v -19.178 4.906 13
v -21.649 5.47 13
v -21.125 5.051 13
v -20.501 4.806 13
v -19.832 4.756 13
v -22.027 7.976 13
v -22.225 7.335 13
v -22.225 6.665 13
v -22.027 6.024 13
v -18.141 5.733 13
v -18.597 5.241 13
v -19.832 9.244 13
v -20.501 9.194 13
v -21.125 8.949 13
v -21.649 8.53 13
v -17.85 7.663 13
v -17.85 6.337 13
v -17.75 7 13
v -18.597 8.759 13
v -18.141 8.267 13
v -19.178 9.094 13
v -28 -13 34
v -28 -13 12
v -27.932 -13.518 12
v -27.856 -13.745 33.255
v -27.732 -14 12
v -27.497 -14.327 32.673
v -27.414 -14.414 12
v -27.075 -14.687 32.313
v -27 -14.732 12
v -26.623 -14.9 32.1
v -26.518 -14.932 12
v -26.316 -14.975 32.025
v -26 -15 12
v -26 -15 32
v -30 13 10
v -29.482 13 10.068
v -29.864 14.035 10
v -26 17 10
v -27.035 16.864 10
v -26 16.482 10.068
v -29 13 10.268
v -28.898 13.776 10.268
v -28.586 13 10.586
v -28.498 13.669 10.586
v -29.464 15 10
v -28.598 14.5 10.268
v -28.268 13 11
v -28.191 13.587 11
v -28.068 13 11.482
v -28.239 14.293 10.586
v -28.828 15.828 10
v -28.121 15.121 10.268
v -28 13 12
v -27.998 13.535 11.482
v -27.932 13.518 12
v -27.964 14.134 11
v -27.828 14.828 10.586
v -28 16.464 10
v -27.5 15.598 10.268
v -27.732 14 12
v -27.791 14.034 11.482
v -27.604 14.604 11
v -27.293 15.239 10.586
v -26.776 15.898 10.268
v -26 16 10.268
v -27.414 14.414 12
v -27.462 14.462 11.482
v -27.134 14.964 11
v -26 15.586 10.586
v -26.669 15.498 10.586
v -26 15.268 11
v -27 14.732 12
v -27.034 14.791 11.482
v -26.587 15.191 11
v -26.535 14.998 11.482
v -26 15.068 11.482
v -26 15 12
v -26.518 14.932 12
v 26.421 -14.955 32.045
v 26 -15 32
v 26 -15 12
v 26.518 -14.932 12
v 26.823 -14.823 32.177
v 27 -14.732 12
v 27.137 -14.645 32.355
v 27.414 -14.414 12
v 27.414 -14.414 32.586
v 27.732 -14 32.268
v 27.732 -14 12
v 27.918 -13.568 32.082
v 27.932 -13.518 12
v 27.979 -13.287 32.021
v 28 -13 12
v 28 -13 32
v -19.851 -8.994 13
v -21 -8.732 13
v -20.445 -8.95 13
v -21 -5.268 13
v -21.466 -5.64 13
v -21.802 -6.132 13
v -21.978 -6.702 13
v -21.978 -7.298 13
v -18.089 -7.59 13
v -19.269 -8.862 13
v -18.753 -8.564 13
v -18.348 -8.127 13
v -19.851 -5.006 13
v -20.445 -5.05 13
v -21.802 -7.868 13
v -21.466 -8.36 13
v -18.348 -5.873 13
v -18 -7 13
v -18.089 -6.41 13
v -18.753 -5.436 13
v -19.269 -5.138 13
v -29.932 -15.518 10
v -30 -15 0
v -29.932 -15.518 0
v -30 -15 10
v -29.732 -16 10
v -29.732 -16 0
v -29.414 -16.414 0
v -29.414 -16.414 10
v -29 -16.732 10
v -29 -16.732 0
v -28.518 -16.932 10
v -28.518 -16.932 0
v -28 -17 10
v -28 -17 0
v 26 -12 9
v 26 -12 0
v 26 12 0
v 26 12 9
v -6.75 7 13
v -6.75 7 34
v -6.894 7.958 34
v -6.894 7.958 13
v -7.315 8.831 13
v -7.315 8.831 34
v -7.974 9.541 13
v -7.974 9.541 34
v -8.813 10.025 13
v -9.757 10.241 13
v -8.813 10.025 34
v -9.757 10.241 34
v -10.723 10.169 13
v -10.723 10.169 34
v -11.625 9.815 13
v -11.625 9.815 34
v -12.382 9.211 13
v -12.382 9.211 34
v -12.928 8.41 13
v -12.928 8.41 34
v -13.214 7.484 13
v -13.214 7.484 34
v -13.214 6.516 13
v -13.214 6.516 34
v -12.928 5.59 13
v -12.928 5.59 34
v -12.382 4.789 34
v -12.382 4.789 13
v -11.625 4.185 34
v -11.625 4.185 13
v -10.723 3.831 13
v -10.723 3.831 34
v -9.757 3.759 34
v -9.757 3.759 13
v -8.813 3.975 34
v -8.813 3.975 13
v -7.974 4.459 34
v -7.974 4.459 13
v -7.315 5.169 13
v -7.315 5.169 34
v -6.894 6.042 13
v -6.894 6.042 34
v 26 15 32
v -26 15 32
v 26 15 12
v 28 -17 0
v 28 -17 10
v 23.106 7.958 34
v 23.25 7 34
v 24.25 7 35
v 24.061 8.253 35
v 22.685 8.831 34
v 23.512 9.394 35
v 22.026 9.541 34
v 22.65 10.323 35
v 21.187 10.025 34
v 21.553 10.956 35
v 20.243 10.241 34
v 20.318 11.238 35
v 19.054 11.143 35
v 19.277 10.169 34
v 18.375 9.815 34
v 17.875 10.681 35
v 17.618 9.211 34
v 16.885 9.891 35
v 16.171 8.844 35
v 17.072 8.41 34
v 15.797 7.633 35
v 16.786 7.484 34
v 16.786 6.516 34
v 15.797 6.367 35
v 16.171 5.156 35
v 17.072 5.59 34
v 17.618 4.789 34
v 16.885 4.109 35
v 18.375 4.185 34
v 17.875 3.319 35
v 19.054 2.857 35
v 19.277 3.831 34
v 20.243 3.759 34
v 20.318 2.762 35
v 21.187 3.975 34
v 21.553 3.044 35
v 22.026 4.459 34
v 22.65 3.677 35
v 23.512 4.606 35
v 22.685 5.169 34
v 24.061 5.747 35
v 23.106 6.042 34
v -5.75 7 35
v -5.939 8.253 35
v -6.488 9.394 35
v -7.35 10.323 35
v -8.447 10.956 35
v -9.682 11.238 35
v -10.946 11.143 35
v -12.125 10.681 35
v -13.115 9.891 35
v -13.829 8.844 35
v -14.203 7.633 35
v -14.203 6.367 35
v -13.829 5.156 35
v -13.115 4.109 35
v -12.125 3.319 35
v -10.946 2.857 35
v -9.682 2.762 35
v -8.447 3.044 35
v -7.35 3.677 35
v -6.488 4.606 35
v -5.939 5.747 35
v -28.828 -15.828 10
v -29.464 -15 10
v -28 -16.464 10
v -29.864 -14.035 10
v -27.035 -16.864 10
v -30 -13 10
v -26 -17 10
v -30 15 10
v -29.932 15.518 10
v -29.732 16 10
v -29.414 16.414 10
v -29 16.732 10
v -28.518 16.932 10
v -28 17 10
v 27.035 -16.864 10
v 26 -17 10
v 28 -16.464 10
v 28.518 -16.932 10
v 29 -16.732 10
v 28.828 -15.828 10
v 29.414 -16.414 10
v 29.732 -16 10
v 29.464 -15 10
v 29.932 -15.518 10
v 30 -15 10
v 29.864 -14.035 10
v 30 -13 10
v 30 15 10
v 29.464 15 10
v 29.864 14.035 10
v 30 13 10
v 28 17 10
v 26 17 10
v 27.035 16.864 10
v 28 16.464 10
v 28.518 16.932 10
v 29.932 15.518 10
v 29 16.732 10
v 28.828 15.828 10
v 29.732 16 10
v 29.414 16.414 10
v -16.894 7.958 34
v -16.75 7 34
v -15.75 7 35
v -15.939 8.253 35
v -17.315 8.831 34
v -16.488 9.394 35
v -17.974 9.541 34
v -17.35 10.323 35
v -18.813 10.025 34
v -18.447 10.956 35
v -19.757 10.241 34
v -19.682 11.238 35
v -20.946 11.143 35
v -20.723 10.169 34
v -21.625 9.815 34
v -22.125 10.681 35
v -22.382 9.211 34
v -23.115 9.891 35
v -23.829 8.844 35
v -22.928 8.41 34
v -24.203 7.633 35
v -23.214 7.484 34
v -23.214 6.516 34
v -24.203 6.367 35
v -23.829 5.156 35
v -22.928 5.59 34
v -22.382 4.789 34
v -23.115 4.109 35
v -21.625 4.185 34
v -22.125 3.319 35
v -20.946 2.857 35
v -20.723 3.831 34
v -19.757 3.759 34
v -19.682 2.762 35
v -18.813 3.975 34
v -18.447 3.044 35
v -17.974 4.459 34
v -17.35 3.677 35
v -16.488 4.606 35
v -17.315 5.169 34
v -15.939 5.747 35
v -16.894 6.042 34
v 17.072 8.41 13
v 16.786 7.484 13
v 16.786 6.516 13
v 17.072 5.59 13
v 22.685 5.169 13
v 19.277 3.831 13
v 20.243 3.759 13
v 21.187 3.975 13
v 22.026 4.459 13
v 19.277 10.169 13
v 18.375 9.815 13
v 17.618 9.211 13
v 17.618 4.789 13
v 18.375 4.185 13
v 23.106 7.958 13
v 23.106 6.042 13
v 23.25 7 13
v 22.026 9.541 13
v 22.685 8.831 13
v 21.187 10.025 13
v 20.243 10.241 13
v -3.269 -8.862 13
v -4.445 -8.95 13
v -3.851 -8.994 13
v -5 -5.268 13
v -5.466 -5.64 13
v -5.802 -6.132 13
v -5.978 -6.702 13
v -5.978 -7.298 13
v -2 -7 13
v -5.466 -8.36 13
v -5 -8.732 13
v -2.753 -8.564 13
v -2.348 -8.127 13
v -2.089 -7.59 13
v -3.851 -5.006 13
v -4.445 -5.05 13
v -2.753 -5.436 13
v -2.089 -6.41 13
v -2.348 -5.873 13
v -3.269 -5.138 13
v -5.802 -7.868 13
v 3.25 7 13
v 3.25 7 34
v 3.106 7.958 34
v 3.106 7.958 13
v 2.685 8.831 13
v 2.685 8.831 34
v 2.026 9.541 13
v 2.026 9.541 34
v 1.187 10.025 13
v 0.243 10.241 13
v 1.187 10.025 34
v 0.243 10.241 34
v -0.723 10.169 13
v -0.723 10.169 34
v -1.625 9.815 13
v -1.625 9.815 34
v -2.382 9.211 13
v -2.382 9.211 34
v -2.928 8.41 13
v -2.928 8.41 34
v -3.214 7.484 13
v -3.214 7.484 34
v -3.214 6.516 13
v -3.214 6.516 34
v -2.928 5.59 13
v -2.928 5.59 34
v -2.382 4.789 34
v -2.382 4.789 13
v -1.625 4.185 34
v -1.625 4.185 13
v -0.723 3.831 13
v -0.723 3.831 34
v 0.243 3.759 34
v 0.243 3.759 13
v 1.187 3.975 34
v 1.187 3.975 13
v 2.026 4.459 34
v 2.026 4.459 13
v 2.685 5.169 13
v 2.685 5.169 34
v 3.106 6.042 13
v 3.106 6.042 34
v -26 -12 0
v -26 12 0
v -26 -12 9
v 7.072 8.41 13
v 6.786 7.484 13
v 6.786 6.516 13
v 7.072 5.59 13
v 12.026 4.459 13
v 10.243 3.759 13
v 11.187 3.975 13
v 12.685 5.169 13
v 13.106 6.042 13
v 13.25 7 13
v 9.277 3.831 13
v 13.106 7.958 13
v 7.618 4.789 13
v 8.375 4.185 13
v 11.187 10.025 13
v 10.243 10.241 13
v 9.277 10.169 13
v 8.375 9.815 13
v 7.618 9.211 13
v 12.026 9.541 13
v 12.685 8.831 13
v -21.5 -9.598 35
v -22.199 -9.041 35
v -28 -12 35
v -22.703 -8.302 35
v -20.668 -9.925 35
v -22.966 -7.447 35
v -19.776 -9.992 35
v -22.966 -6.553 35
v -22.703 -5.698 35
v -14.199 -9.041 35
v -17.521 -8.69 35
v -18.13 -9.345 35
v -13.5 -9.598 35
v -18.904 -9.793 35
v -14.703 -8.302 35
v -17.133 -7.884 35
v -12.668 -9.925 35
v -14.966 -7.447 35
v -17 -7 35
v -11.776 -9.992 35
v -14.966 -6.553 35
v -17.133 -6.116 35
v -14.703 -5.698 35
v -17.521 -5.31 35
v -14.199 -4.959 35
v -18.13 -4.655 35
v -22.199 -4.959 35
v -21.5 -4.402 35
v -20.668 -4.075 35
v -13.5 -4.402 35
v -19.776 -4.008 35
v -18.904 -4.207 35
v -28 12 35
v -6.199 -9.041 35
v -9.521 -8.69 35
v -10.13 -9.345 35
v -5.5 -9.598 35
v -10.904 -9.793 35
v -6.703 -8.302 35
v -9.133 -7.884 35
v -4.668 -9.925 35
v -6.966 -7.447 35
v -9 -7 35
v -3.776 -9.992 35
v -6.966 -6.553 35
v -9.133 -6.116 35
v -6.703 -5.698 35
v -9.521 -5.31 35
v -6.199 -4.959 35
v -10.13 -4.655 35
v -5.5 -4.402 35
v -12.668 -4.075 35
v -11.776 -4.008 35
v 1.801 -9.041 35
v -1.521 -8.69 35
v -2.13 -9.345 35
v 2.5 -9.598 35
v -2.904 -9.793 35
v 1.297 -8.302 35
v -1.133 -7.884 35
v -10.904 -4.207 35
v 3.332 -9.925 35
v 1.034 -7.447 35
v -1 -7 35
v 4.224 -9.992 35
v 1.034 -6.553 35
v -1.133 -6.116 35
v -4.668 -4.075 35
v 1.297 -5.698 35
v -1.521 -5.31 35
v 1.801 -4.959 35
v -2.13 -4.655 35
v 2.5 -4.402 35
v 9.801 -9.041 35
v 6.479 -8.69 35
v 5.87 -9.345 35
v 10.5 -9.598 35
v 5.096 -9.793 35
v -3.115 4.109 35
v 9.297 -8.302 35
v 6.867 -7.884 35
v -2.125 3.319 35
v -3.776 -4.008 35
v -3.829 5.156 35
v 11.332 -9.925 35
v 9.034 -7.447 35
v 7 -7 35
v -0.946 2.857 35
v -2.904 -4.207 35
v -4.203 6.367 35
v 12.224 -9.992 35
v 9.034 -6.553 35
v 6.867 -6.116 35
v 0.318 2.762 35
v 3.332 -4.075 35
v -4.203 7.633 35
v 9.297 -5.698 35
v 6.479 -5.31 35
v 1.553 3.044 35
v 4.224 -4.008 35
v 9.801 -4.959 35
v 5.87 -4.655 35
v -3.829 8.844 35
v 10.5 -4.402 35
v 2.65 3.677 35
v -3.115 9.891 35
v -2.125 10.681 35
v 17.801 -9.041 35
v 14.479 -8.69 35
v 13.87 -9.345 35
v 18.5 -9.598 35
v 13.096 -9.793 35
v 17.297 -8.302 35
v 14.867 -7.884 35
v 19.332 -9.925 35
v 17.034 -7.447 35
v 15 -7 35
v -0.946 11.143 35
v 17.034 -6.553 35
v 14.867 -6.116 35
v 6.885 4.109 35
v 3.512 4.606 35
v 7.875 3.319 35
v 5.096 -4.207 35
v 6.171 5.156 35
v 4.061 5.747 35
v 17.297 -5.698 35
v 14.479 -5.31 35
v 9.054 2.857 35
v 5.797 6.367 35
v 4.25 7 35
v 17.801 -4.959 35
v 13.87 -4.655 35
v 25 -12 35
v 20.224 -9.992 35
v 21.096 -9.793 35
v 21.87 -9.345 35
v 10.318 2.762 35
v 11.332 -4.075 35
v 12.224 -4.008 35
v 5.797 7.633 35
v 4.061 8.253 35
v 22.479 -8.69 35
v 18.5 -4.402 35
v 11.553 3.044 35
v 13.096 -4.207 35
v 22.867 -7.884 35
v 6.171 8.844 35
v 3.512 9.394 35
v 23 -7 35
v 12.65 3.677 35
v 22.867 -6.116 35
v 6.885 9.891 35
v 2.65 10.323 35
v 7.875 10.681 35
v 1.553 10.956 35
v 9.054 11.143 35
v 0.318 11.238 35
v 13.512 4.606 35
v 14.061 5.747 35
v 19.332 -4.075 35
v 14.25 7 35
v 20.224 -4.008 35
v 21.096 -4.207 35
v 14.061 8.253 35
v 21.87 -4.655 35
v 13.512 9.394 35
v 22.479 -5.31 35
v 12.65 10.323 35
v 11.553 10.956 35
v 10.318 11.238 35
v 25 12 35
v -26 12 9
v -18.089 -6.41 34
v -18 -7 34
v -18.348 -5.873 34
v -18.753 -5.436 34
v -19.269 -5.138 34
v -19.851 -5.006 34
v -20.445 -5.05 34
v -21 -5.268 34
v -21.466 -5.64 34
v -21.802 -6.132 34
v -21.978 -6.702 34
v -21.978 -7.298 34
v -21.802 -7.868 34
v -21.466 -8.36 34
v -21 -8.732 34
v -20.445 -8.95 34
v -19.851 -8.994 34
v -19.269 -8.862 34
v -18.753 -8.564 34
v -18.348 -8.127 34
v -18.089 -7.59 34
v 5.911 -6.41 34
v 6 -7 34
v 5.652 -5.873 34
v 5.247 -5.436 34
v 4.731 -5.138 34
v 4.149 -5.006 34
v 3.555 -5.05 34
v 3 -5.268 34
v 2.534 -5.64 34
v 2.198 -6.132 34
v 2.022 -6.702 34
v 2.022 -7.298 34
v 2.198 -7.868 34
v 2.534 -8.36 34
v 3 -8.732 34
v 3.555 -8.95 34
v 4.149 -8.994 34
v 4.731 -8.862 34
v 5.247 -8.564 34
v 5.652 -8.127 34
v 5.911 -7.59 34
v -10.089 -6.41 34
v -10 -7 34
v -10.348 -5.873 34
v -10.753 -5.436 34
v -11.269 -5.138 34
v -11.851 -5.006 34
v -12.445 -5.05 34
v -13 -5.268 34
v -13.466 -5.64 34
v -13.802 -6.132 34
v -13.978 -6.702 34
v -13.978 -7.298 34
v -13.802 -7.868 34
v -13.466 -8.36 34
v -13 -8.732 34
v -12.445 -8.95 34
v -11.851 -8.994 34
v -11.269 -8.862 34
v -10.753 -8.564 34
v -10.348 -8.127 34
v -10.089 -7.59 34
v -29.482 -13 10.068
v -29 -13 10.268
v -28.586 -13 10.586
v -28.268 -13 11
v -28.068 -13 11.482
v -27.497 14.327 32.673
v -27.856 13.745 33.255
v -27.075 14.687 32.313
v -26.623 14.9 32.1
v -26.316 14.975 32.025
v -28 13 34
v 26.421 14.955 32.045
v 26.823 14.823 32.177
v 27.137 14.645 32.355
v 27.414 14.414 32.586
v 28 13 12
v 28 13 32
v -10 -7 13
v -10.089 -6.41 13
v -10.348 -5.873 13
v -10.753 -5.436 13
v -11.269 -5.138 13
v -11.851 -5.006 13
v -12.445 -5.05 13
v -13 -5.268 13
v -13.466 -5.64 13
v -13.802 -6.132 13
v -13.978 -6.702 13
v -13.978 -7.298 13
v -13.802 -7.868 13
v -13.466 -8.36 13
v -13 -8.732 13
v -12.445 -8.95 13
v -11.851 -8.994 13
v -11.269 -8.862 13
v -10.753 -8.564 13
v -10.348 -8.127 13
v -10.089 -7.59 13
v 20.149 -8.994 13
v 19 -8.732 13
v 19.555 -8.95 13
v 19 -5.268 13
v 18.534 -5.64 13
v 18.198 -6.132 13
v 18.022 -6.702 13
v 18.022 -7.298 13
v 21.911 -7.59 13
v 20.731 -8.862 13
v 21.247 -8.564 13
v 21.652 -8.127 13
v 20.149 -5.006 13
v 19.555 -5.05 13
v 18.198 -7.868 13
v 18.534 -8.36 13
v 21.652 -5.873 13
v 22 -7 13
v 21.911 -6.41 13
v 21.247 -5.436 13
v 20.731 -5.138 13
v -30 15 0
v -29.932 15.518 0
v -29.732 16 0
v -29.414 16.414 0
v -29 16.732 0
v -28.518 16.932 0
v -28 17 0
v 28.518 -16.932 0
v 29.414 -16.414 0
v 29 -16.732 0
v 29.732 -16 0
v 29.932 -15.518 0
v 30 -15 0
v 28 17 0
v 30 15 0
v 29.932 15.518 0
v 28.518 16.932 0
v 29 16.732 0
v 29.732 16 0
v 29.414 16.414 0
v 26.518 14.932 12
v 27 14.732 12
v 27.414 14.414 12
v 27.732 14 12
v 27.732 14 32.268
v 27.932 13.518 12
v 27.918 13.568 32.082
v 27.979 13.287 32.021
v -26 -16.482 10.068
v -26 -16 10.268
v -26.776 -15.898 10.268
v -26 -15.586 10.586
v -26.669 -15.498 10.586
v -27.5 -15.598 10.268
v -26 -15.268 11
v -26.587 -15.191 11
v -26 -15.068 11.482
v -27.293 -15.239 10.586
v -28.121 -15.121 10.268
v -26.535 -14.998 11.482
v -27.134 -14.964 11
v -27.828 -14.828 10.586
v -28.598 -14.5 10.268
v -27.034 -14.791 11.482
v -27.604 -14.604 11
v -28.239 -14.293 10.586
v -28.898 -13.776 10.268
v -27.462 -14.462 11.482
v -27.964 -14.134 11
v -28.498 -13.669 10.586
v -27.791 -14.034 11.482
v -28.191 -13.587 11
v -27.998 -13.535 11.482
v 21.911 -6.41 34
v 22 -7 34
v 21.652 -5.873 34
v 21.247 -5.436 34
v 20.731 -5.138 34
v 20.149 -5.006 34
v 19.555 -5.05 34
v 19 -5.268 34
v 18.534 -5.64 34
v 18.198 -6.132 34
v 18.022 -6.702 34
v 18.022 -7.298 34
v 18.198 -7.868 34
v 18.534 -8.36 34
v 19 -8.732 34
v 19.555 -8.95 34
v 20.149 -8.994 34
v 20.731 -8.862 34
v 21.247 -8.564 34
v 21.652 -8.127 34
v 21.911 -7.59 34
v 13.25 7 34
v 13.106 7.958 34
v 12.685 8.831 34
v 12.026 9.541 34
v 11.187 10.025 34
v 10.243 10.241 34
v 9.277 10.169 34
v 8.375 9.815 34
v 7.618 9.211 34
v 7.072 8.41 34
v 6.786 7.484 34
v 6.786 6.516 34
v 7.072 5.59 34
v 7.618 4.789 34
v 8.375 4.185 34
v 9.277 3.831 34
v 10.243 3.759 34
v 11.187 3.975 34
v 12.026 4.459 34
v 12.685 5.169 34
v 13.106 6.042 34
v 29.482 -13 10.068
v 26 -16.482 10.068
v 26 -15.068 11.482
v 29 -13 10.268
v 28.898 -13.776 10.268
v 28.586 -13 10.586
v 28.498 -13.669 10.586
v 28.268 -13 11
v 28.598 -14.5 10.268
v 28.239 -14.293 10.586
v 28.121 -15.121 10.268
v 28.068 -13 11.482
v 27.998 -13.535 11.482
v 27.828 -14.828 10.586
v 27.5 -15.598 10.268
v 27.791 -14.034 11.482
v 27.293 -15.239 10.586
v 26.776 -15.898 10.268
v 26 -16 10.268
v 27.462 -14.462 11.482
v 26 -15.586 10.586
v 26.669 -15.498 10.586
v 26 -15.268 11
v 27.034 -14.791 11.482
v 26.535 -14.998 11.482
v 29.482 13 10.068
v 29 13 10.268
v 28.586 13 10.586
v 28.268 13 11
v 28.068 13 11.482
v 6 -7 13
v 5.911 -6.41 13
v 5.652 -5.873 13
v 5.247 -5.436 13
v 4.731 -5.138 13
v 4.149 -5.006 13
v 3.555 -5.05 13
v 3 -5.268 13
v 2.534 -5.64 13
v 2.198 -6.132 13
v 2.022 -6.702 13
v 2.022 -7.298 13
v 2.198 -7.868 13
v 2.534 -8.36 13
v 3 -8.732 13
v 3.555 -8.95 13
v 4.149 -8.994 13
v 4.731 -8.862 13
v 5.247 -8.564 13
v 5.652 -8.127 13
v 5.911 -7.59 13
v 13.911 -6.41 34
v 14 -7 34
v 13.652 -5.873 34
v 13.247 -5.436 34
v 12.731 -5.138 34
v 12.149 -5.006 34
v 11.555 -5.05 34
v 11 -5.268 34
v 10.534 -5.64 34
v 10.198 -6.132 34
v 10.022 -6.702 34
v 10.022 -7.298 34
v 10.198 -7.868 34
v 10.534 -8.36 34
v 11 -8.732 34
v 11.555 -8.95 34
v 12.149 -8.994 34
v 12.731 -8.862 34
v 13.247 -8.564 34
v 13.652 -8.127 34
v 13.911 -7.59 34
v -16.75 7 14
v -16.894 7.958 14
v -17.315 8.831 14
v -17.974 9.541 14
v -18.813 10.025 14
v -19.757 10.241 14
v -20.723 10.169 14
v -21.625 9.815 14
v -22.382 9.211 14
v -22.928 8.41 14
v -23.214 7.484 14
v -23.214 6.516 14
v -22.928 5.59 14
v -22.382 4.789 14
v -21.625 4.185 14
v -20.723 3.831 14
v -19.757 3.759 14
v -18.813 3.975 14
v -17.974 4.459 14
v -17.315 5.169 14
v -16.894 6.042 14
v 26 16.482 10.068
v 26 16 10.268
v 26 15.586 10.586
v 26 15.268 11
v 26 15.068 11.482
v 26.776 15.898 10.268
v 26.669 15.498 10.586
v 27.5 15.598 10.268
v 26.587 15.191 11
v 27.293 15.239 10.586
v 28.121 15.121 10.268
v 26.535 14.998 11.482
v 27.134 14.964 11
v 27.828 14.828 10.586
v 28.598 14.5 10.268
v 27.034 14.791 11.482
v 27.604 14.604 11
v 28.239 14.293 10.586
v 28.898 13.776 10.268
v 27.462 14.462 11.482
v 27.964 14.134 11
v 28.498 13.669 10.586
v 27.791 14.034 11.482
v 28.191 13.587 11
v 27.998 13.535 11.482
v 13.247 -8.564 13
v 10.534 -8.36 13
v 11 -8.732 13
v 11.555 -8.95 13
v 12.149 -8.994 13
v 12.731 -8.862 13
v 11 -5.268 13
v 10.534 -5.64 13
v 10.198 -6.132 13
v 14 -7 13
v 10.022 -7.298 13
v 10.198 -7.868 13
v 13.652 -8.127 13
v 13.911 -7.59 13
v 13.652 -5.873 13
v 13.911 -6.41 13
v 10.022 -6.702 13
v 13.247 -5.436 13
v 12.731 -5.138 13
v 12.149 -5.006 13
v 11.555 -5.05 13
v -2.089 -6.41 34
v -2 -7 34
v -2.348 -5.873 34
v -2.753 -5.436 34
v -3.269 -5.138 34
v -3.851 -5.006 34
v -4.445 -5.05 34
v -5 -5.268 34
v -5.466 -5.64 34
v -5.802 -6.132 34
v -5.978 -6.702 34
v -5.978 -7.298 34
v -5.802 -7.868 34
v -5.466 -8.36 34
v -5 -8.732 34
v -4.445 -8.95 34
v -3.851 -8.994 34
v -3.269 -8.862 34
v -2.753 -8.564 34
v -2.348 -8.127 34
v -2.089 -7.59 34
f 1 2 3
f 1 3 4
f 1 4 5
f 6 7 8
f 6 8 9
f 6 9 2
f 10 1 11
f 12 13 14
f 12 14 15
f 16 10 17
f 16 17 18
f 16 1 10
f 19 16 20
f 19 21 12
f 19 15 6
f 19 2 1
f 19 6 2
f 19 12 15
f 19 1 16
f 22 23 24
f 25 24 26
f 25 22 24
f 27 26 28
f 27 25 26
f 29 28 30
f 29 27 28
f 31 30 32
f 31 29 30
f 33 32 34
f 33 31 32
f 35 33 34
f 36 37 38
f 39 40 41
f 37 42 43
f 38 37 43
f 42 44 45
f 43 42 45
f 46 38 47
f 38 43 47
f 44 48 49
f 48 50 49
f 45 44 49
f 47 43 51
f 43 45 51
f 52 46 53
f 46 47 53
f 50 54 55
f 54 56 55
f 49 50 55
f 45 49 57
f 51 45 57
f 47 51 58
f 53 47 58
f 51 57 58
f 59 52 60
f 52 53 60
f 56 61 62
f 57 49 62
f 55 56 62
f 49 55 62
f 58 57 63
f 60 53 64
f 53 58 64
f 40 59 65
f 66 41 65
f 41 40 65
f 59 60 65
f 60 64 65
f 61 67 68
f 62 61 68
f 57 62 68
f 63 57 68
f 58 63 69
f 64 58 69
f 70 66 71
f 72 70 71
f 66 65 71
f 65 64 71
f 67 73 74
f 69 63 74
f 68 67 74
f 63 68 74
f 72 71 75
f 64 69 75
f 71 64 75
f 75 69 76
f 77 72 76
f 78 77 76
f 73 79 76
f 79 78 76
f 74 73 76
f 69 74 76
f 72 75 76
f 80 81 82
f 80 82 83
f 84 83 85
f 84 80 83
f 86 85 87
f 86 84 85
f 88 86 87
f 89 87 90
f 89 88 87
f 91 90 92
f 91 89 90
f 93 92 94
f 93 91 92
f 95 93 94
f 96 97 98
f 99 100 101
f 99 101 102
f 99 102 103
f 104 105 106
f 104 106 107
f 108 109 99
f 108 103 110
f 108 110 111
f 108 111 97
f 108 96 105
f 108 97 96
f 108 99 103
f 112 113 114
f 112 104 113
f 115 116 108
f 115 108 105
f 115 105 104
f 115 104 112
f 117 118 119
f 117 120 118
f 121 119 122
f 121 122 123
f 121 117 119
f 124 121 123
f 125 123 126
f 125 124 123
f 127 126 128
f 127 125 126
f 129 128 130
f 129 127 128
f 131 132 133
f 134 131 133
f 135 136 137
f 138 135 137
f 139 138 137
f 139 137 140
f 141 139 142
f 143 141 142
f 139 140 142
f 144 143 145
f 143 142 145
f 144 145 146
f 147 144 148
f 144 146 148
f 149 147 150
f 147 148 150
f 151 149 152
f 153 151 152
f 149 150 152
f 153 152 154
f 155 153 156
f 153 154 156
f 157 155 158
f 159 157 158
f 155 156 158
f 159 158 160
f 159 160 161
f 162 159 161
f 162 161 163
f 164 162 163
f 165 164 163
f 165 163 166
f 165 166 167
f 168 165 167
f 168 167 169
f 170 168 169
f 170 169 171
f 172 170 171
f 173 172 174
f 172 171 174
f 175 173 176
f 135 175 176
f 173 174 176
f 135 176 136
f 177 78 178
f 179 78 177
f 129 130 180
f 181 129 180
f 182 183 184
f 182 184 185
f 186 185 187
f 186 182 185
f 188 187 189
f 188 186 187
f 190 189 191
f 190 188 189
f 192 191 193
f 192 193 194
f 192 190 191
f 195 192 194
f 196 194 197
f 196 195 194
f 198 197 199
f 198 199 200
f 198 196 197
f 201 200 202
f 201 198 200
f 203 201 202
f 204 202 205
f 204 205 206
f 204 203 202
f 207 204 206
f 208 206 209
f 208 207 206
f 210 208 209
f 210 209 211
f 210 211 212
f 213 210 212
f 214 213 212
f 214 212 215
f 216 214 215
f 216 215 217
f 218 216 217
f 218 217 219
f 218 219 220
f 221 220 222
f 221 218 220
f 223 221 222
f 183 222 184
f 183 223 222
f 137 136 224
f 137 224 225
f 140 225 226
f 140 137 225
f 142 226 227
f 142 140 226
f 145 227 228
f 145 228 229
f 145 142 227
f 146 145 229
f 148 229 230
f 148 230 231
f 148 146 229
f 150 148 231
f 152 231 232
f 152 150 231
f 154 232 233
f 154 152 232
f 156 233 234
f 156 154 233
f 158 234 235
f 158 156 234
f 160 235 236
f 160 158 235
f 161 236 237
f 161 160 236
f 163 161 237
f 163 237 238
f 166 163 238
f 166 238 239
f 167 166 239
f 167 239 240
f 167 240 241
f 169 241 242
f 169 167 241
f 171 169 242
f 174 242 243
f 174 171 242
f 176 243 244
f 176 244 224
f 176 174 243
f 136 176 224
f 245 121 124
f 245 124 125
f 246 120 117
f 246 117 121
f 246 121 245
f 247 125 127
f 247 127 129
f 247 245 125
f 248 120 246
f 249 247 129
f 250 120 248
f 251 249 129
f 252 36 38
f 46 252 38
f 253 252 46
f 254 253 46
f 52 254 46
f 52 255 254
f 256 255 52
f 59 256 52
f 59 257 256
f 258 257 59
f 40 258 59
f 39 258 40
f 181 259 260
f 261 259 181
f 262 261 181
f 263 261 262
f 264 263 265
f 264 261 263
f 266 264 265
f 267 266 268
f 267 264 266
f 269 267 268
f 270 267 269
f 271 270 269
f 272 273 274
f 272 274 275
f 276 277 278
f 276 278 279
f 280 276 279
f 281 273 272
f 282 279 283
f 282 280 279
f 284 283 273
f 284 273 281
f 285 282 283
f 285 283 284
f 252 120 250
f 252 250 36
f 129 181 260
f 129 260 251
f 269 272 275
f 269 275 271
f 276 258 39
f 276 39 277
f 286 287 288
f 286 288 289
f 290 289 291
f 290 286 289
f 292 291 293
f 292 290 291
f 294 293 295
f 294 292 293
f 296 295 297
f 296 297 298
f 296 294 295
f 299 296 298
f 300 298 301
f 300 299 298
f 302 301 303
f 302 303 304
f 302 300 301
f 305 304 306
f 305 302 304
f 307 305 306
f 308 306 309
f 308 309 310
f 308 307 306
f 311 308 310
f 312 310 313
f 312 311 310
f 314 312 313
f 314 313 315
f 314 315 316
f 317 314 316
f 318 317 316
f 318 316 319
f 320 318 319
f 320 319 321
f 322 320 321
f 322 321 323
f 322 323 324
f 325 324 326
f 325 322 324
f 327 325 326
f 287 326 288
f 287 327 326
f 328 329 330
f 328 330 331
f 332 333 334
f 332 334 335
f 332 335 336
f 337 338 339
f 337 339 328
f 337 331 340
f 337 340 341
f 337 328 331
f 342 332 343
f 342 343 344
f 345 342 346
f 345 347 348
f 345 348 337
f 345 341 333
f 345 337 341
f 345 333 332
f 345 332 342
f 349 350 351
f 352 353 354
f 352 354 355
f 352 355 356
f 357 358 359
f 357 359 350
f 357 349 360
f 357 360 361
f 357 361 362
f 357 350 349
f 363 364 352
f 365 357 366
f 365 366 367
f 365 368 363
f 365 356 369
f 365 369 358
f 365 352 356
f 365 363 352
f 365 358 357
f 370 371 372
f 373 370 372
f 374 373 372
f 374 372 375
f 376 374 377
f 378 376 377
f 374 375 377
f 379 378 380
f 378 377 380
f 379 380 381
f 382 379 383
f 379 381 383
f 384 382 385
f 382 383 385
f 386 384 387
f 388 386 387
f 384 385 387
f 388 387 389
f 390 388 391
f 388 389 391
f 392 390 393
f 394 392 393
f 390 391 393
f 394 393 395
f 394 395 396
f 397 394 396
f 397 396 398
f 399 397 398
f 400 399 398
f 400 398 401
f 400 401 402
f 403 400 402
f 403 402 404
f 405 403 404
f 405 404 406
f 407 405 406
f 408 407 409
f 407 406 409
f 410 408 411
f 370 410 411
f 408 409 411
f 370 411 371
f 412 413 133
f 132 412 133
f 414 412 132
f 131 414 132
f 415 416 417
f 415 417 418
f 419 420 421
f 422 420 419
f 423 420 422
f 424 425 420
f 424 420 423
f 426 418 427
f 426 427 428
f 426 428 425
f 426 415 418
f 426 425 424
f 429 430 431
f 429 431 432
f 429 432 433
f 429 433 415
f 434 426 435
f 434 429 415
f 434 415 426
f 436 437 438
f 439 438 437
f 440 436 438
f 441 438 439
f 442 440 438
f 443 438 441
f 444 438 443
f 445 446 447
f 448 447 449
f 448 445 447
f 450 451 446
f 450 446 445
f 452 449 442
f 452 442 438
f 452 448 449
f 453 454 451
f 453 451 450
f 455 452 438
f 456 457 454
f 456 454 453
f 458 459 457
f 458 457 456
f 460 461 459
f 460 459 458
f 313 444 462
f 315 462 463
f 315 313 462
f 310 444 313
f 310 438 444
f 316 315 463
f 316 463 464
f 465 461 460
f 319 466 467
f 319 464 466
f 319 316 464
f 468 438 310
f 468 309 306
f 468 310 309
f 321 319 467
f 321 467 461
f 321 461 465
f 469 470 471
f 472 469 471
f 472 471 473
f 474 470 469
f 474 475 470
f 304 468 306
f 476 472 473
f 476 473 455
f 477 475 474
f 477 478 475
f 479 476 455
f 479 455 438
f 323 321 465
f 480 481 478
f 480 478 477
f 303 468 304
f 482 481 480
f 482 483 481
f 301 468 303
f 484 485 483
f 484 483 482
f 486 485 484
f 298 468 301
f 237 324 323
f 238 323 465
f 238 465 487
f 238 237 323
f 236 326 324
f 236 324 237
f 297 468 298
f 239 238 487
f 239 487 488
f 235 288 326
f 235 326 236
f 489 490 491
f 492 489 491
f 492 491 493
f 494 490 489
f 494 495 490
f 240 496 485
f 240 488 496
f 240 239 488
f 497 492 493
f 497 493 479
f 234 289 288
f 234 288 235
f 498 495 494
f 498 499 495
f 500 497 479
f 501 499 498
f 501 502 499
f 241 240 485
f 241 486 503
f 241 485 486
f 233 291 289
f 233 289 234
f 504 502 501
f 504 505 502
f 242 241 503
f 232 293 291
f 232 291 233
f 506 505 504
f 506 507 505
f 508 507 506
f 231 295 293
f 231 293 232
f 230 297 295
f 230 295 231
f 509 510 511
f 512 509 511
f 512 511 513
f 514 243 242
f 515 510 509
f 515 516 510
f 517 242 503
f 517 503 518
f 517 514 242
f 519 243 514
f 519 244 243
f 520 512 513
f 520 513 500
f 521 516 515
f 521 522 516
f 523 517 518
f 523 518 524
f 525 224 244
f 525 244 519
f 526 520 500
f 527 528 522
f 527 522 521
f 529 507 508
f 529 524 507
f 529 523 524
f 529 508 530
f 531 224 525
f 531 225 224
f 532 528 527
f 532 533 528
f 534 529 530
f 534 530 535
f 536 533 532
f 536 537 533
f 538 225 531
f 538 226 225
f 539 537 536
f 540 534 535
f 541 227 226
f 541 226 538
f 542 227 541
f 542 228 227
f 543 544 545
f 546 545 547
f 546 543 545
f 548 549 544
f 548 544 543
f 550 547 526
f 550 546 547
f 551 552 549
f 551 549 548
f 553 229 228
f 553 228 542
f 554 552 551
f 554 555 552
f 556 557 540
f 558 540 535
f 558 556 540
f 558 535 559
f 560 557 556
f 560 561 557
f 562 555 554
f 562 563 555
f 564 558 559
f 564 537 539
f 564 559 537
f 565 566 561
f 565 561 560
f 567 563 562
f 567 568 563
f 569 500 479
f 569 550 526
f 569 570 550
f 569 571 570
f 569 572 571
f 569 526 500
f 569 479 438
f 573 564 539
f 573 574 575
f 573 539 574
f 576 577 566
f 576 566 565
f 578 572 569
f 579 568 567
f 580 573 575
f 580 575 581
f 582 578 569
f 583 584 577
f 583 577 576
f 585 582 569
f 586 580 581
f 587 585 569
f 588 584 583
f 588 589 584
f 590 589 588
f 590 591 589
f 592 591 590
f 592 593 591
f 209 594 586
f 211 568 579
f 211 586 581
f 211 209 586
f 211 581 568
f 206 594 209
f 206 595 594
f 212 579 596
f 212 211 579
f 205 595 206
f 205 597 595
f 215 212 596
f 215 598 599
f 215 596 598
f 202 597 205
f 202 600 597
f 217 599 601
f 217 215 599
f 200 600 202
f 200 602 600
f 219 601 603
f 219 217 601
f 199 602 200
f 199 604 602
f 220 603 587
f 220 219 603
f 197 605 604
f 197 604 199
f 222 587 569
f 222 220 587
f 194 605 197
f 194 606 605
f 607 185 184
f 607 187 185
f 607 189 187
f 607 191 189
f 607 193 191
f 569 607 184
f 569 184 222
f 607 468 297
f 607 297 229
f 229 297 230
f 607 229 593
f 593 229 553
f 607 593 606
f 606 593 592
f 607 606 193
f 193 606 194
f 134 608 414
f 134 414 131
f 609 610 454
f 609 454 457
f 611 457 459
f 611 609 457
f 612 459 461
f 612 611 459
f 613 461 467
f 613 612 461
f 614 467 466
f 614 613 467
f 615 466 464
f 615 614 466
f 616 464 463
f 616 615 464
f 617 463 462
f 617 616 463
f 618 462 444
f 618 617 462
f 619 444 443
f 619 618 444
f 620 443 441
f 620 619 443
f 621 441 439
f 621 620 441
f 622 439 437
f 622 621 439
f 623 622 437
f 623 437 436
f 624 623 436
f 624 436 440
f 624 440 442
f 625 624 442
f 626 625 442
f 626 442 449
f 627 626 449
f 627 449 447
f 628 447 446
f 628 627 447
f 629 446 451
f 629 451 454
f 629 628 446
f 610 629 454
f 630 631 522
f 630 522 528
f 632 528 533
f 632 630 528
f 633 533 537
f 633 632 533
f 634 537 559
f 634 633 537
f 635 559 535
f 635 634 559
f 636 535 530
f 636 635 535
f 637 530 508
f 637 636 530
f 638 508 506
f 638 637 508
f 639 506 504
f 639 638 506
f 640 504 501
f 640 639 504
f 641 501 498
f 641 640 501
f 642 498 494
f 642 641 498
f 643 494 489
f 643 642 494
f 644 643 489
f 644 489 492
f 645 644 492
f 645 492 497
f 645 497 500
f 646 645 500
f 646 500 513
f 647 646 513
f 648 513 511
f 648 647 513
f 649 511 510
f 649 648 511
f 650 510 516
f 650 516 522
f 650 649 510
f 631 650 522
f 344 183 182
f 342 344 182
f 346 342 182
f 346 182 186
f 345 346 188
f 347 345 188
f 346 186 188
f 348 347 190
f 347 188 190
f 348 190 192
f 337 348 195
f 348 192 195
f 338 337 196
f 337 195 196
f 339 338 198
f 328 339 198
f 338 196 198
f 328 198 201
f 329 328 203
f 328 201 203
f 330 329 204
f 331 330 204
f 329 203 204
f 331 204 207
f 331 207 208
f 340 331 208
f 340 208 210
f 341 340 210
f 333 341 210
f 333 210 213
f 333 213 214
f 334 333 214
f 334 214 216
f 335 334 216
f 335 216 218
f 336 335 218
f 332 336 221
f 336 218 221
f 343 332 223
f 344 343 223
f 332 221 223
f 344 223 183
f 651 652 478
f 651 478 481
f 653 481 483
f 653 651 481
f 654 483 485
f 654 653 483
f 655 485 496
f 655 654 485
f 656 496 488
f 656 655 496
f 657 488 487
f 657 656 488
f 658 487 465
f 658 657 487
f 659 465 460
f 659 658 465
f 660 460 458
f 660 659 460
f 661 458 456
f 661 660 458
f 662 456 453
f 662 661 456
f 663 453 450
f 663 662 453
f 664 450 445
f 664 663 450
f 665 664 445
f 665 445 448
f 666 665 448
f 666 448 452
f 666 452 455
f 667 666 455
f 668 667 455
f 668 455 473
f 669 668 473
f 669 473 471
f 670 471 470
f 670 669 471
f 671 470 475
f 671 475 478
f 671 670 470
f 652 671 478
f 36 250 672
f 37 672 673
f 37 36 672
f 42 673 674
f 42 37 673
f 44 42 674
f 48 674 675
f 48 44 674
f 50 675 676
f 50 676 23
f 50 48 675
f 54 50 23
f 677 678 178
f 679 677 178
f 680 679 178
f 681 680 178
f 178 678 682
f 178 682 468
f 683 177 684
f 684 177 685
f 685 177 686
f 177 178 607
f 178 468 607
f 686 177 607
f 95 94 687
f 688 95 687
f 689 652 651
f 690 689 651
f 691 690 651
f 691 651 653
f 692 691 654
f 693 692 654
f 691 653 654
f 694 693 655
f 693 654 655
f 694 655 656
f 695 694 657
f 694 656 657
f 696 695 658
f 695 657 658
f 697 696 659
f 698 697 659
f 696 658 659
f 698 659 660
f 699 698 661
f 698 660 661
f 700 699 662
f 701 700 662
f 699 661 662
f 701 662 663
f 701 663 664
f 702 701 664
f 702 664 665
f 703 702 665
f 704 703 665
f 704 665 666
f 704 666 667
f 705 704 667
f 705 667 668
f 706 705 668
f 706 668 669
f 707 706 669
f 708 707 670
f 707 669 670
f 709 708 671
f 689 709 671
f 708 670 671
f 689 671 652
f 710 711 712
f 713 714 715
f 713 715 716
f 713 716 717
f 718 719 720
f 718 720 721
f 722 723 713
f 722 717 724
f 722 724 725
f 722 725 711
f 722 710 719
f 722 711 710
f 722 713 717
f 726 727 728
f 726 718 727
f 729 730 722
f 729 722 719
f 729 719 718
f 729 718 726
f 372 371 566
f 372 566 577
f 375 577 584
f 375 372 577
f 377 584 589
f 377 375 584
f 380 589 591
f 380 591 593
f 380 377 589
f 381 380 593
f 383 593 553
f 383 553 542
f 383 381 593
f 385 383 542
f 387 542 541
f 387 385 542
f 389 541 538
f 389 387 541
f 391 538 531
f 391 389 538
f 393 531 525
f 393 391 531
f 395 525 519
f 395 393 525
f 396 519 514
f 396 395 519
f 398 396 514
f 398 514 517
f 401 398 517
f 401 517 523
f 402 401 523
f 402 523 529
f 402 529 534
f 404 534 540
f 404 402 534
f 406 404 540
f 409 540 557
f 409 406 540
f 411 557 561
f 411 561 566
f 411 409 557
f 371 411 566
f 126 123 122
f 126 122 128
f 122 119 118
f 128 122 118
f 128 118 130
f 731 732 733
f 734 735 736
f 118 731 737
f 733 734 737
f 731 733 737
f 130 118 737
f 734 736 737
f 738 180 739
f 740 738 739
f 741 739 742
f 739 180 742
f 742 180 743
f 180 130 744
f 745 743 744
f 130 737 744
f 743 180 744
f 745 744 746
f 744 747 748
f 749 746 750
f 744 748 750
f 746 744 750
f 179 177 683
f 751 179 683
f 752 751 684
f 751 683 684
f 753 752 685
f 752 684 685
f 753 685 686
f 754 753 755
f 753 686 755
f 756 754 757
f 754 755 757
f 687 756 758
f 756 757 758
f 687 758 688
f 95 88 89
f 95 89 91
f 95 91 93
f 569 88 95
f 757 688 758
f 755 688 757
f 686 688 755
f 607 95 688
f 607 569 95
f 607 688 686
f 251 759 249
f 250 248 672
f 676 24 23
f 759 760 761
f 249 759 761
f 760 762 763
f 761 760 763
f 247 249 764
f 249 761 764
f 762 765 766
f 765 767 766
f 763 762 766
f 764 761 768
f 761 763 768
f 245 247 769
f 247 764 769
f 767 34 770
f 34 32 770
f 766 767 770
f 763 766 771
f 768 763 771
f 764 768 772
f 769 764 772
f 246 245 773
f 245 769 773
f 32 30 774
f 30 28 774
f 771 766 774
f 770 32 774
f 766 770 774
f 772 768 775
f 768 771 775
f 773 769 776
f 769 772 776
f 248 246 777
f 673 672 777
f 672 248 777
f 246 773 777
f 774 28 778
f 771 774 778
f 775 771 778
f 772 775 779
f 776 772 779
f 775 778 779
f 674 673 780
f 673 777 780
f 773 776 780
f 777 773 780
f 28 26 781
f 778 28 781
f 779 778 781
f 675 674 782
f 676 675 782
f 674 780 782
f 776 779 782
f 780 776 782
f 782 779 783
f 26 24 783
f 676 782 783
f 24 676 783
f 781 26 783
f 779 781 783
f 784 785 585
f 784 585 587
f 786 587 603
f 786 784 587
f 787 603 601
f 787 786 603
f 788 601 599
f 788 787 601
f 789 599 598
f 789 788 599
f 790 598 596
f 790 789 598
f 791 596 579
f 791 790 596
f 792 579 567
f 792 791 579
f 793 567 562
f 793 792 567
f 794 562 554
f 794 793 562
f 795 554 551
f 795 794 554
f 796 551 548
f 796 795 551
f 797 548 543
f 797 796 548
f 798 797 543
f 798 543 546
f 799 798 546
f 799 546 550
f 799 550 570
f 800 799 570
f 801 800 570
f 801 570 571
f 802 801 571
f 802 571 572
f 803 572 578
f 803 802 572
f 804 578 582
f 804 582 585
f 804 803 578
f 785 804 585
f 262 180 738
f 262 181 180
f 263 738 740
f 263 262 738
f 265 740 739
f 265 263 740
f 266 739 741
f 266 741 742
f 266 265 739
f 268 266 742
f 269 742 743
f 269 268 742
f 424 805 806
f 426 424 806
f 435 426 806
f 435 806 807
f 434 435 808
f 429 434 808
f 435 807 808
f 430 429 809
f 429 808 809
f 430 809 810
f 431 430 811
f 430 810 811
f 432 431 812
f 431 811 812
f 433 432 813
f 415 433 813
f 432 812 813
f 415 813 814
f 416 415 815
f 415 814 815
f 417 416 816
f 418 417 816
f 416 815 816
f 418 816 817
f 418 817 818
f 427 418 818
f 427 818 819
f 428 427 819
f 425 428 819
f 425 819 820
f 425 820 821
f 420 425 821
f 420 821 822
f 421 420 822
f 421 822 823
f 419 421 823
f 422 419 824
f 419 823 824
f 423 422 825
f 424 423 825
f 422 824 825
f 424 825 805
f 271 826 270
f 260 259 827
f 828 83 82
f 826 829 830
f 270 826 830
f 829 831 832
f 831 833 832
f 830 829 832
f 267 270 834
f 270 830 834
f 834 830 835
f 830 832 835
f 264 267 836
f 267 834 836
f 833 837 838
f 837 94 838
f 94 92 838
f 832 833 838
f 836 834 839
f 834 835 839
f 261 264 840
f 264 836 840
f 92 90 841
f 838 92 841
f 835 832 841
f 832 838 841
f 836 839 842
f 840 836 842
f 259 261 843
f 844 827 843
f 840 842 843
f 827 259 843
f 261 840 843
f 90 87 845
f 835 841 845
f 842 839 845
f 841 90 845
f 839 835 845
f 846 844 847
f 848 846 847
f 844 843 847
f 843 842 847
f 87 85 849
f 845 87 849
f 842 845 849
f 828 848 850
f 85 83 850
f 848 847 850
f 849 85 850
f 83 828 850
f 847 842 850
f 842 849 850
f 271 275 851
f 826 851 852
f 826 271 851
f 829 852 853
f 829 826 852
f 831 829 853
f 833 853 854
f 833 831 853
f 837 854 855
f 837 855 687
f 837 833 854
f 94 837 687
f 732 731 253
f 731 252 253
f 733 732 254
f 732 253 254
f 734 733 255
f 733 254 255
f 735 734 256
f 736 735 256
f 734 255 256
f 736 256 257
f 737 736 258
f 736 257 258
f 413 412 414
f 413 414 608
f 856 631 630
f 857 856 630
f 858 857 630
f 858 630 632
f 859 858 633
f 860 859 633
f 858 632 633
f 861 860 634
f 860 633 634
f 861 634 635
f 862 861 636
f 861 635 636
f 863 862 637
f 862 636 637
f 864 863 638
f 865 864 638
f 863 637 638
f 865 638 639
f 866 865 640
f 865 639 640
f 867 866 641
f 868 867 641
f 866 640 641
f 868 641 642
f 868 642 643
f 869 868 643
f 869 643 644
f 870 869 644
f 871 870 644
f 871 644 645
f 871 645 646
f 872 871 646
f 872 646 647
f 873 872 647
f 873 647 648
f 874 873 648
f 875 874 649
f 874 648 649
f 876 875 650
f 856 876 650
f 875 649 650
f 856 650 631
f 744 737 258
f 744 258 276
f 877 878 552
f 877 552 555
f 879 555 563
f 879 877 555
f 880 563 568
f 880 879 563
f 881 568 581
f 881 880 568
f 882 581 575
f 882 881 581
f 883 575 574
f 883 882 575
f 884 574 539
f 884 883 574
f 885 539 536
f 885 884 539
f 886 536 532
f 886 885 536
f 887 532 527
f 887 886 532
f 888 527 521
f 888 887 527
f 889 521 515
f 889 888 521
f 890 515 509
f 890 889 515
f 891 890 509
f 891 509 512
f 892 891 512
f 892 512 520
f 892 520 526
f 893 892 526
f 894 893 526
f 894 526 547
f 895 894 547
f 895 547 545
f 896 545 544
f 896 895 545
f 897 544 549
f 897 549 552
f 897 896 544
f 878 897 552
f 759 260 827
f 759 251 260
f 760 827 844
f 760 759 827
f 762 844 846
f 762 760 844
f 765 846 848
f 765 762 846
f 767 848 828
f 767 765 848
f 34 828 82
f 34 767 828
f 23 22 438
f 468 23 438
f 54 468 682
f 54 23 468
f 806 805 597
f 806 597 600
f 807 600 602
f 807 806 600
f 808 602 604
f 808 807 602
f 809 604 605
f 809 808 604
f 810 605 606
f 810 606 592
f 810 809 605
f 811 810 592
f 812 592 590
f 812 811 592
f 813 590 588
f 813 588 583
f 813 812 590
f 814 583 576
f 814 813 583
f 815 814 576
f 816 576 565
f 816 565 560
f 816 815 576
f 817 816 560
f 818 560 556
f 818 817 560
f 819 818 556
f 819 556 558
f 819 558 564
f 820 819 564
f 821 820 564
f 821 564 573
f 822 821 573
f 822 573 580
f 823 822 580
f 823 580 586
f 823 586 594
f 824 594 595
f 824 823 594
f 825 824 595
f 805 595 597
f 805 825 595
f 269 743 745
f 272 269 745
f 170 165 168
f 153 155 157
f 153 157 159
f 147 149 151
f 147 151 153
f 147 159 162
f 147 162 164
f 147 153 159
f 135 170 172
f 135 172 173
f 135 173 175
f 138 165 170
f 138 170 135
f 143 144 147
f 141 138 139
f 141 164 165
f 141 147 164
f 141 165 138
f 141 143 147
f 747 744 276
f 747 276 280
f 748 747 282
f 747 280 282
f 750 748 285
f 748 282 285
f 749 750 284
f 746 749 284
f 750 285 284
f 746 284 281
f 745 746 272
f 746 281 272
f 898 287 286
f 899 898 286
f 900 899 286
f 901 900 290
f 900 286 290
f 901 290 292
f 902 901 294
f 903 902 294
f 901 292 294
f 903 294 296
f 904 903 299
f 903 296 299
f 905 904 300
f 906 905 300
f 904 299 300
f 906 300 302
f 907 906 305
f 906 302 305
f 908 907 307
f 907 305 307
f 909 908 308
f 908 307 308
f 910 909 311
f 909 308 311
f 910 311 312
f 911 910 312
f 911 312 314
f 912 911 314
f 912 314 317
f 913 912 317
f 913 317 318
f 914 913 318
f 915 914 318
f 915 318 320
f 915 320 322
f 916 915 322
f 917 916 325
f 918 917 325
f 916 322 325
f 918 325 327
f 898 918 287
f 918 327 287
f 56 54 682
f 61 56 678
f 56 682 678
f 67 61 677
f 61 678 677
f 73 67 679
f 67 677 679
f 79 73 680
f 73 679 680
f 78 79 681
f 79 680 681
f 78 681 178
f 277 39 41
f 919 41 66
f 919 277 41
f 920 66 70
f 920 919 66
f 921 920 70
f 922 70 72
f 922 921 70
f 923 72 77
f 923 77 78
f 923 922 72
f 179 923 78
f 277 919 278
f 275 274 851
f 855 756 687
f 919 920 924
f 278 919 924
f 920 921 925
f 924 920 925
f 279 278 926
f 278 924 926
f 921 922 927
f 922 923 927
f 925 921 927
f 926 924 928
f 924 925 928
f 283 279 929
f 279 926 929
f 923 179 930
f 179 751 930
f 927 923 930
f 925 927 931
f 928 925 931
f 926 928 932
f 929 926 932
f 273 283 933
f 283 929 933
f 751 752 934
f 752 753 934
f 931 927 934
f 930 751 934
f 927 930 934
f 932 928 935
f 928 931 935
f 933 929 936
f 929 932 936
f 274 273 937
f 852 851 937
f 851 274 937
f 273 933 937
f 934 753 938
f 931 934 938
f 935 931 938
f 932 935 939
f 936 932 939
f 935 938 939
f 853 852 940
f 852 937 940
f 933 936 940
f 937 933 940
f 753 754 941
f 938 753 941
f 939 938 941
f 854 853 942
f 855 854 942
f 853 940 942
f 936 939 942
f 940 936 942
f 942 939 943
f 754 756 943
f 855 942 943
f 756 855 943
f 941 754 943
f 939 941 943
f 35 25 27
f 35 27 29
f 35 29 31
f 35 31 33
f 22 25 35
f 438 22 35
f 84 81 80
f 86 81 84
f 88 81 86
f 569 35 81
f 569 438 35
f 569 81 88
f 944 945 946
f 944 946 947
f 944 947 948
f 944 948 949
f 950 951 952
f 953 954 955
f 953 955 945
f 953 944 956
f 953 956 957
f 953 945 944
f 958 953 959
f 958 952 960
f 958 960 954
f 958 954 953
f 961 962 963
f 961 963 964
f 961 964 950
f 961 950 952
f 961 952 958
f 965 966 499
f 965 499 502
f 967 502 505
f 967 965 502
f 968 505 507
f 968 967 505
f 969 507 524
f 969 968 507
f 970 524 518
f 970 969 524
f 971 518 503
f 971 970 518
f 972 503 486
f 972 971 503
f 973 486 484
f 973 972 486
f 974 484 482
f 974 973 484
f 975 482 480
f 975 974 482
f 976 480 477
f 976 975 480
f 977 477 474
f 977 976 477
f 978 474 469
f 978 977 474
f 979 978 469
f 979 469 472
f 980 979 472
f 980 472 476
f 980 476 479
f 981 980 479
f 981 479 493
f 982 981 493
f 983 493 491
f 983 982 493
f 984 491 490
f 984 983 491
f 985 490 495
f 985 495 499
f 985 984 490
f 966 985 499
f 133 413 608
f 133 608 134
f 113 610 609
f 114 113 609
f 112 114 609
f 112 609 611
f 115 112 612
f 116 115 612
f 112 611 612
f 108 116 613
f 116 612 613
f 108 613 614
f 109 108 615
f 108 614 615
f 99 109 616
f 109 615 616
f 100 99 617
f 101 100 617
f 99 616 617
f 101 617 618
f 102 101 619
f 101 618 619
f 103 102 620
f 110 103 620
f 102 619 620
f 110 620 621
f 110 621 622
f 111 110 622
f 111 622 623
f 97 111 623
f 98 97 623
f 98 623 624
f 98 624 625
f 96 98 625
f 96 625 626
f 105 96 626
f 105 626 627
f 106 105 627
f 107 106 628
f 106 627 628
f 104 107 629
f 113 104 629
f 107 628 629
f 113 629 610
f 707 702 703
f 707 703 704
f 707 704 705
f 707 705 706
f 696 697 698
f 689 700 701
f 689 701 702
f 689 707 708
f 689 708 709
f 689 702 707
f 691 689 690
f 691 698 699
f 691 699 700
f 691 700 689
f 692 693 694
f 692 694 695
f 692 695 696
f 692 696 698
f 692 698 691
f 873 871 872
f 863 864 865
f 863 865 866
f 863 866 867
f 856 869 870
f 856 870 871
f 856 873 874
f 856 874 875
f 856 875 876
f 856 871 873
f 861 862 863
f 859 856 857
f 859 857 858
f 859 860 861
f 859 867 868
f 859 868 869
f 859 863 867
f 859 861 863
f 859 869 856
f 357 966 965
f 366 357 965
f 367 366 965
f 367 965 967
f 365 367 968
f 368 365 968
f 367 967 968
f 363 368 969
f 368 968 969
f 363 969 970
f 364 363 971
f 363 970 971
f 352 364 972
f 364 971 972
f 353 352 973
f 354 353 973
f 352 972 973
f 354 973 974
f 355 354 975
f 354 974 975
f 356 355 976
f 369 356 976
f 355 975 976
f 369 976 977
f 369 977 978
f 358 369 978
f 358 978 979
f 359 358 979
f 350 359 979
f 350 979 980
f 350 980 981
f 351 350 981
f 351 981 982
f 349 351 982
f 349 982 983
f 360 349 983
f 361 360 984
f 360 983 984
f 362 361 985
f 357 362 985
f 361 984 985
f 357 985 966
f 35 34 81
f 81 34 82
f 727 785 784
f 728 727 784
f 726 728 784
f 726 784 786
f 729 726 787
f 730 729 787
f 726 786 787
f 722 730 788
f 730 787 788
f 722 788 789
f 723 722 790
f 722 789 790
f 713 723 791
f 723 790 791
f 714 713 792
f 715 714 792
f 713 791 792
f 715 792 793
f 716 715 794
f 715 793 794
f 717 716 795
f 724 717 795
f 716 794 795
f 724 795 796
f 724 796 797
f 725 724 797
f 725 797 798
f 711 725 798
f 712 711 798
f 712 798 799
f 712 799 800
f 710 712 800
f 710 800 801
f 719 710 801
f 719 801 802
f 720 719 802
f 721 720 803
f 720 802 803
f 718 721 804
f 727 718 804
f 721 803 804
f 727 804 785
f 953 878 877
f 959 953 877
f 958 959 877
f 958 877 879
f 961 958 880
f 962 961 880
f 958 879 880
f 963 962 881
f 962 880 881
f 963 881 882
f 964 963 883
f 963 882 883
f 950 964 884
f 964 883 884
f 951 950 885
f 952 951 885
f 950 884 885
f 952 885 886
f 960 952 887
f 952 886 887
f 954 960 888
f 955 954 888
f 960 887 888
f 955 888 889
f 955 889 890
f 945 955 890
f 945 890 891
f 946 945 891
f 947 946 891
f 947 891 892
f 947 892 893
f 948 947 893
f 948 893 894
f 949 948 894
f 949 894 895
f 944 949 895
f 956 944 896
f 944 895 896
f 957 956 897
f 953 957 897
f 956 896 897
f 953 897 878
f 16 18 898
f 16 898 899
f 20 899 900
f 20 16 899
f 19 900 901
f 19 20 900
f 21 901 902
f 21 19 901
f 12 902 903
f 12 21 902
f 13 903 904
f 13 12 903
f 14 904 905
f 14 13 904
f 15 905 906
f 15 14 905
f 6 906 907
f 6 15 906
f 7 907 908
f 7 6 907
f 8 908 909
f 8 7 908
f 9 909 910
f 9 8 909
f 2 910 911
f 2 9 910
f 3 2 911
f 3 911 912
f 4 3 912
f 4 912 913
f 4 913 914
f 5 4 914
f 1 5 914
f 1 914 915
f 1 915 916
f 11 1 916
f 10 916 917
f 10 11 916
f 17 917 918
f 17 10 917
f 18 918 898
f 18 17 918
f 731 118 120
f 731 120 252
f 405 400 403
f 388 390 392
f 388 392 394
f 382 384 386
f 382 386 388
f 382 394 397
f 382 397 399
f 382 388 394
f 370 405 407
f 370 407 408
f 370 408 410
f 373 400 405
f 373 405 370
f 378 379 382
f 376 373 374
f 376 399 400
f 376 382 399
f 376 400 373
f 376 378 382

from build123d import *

# Parameters (mm, degrees)
F0_W      = 60
F0_H      = 34
F0_W_2    = 56
F0_H_2    = 30
F1_DEPTH  = 10
F2_DEPTH  = 35
F3_R      = 2
F3_R_2    = 3.25
F4_DEPTH  = 22
F5_SIZE   = 3
F6_SIZE   = 1
F7_R      = 2
F8_R      = 1.99999
F9_W      = 52
F9_H      = 24
F10_DEPTH = 9


# Not quite as in the source:
# - a fillet or chamfer is up to 0.001 mm smaller than in the source, because OpenCascade refuses the exact size


with BuildPart() as f1:
    # F0 (on Top) → F1 (new body)
    with BuildSketch(Plane.XY):
        Rectangle(F0_W, F0_H)
        Rectangle(F0_W_2, F0_H_2, mode=Mode.SUBTRACT)
        Rectangle(F0_W_2, F0_H_2)
    extrude(amount=F1_DEPTH)

    # F0 (on Top) → F2 (join)
    with BuildSketch(Plane.XY):
        Rectangle(F0_W_2, F0_H_2)
    extrude(amount=F2_DEPTH)

    # F3 (on face) → F4 (cut)
    with BuildSketch(Plane.XY.offset(35)):
        with Locations((-20, -7)):
            Circle(F3_R)
        with Locations((-12, -7)):
            Circle(F3_R)
        with Locations((-4, -7)):
            Circle(F3_R)
        with Locations((4, -7)):
            Circle(F3_R)
        with Locations((12, -7)):
            Circle(F3_R)
        with Locations((20, -7)):
            Circle(F3_R)
        with Locations((-20, 7)):
            Circle(F3_R_2)
        with Locations((-10, 7)):
            Circle(F3_R_2)
        with Locations((0, 7)):
            Circle(F3_R_2)
        with Locations((10, 7)):
            Circle(F3_R_2)
        with Locations((20, 7)):
            Circle(F3_R_2)
    extrude(amount=-F4_DEPTH, mode=Mode.SUBTRACT)

    # F5
    f5_edges = [f1.edges().sort_by_distance(p)[0] for p in [
        (0, 15, 35),
        (28, 0, 35),
        (0, -15, 35),
    ]]
    chamfer(f5_edges, length=F5_SIZE)

    # F6
    f6_edges = [f1.edges().sort_by_distance(p)[0] for p in [
        (-16.75, 7, 24),
        (-23.25, 7, 35),
        (-23.25, 7, 13),
        (-13.25, 7, 35),
        (-3.25, 7, 35),
        (6.75, 7, 35),
        (16.75, 7, 35),
        (-22, -7, 35),
        (-14, -7, 35),
        (-6, -7, 35),
        (2, -7, 35),
        (10, -7, 35),
        (18, -7, 35),
    ]]
    chamfer(f6_edges, length=F6_SIZE)

    # F7
    f7_edges = [f1.edges().sort_by_distance(p)[0] for p in [
        (28, -15, 21),
        (-28, -15, 21),
        (28, 15, 21),
        (-28, 15, 21),
    ]]
    fillet(f7_edges, radius=F7_R)

    # F8 (radius 2 in the source; OpenCascade refuses exactly that, so slightly less here)
    f8_edges = [f1.edges().sort_by_distance(p)[0] for p in [
        (-30, -17, 5),
        (0, -15, 10),
        (30, -17, 5),
        (30, 17, 5),
        (-30, 17, 5),
    ]]
    fillet(f8_edges, radius=F8_R)


with BuildPart() as f10:
    # F9 (on face) → F10 (new body)
    with BuildSketch(Plane.XY):
        Rectangle(F9_W, F9_H)
    extrude(amount=F10_DEPTH)


solid = Compound([f1.part, f10.part])
